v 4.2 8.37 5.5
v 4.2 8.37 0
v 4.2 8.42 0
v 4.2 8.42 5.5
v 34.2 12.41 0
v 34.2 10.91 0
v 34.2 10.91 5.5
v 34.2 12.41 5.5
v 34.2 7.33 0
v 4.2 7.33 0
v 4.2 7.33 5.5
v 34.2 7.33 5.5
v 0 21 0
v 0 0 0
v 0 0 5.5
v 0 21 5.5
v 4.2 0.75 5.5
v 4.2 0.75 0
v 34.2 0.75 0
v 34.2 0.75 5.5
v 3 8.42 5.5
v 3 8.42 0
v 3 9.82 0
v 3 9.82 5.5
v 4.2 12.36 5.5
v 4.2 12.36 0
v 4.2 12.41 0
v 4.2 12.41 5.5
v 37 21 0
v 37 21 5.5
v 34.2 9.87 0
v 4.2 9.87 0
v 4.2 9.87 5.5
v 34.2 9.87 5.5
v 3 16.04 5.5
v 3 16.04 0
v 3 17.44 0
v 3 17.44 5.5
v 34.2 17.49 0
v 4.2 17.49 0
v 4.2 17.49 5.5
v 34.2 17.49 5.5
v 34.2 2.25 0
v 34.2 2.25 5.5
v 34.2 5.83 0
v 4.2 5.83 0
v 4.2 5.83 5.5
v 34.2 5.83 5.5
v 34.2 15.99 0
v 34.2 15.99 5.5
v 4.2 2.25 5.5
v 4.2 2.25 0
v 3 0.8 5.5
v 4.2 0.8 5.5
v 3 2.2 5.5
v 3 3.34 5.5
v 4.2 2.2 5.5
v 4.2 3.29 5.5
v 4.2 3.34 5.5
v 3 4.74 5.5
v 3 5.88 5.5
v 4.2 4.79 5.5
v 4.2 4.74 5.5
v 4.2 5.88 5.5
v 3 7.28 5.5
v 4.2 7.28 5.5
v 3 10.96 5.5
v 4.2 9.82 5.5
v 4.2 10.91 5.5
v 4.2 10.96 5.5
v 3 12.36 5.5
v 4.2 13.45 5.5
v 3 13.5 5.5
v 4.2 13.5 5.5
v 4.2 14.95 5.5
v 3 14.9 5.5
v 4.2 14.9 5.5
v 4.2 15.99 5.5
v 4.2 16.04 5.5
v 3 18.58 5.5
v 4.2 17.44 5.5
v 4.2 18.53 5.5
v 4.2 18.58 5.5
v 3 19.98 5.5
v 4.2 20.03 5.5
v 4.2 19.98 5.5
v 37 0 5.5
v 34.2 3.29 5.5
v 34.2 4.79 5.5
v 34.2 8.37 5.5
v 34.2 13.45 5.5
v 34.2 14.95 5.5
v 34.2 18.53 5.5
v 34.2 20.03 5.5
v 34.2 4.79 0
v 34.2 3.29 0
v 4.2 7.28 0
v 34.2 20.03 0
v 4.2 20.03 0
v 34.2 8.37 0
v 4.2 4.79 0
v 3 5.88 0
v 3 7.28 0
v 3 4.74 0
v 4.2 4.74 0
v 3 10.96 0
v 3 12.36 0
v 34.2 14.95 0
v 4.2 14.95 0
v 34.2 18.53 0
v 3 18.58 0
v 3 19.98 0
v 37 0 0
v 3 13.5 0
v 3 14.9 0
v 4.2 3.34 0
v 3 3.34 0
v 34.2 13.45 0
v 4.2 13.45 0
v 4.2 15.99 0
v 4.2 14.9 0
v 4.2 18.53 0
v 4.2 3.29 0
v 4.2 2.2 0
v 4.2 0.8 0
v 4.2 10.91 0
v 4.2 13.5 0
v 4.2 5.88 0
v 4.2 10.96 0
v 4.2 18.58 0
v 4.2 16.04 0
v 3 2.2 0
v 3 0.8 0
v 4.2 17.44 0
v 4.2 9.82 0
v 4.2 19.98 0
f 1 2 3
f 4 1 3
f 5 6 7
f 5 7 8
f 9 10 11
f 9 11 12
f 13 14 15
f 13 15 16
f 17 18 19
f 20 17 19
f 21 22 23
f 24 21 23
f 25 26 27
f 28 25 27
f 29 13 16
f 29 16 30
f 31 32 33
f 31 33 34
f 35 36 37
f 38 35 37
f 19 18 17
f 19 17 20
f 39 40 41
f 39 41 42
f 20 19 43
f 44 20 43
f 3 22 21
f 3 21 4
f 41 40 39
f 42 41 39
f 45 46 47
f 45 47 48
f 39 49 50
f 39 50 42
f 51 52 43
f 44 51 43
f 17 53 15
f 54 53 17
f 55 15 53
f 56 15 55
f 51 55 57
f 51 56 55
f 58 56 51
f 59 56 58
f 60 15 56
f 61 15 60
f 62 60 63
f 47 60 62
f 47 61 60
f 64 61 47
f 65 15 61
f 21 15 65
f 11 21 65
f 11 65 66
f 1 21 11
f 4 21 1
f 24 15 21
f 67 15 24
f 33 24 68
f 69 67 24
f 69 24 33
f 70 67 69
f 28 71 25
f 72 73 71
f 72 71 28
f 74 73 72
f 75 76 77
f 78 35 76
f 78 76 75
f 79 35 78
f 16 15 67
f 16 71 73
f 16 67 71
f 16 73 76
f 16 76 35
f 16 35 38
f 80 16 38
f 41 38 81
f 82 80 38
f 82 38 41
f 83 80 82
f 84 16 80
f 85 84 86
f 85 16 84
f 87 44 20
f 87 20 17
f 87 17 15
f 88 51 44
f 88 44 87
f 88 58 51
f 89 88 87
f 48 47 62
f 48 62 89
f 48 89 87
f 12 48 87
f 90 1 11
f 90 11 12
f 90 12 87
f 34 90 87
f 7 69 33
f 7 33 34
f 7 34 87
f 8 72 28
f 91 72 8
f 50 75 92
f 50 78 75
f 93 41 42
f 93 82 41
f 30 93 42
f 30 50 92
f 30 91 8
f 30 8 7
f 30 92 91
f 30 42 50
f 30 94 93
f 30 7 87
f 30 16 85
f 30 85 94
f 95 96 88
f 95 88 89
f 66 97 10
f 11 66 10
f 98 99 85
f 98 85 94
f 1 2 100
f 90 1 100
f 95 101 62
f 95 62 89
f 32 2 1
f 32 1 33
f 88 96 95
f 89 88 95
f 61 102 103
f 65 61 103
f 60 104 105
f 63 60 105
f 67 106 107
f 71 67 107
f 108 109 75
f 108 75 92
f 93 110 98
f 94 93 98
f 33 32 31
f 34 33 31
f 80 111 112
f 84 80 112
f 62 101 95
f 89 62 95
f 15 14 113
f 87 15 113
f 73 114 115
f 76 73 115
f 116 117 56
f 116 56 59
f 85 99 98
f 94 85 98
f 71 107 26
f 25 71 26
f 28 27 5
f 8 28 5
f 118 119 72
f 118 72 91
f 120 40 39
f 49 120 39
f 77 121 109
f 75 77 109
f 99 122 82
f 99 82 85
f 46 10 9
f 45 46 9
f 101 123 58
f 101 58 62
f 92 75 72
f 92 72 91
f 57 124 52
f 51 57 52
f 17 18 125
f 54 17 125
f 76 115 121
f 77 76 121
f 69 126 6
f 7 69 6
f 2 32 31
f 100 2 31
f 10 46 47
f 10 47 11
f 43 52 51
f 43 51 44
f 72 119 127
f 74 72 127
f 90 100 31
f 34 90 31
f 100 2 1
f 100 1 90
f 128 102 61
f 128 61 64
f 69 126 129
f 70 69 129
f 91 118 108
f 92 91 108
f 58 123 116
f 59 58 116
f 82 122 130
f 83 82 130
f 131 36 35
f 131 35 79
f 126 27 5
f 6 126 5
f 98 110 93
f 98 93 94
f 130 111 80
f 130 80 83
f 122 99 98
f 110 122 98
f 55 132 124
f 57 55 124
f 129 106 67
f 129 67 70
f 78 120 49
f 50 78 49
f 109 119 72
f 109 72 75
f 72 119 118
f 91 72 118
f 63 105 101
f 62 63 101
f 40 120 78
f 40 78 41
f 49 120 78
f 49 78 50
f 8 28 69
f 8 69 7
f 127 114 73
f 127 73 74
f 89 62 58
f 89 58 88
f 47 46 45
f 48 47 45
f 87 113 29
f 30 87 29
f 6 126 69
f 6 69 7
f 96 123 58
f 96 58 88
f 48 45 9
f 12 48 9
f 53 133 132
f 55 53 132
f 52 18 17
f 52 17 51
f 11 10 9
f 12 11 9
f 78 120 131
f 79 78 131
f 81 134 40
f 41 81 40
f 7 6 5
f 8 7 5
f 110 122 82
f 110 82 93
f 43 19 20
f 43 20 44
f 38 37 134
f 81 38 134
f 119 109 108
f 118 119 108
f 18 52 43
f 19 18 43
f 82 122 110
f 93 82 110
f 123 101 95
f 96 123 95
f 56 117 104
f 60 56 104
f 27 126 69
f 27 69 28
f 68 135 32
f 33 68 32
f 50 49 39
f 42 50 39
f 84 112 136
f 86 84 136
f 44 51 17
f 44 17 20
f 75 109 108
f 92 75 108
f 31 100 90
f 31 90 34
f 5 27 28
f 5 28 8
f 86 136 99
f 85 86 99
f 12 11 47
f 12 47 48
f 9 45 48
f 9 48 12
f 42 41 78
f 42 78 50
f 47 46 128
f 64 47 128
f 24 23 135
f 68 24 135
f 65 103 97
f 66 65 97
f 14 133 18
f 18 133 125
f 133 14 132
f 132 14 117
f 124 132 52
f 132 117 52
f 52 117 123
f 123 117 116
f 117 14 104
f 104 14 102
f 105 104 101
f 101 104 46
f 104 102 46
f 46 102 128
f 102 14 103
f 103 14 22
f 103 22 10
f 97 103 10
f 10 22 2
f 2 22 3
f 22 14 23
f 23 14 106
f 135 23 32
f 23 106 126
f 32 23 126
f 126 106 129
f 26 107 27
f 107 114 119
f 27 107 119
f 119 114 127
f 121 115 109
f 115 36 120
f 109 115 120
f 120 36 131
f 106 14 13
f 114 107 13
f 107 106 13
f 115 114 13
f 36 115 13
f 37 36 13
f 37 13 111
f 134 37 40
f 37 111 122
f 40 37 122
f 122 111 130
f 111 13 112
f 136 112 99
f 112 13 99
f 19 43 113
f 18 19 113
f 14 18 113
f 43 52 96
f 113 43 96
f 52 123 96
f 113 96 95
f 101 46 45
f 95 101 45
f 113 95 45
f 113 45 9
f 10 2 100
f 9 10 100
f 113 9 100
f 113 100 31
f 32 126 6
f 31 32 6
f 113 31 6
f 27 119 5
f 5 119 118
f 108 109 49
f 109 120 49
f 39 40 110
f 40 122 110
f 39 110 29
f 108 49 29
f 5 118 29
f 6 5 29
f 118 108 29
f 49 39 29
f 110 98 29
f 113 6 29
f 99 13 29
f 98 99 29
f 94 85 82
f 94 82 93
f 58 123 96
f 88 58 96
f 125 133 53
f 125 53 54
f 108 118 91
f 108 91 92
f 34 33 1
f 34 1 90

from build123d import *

# Parameters (mm, degrees)
BOX010_W     = 30
BOX010_H     = 1.5
BOX010_DEPTH = 5.5
BOX011_W     = 30
BOX011_H     = 1.5
BOX011_DEPTH = 5.5
BOX012_W     = 30
BOX012_H     = 1.5
BOX012_DEPTH = 5.5
BOX013_W     = 30
BOX013_H     = 1.5
BOX013_DEPTH = 5.5
BOX014_W     = 30
BOX014_H     = 1.5
BOX014_DEPTH = 5.5
BOX015_W     = 30
BOX015_H     = 1.5
BOX015_DEPTH = 5.5
BOX016_W     = 30
BOX016_H     = 1.5
BOX016_DEPTH = 5.5
BOX009_W     = 30
BOX009_H     = 1.5
BOX009_DEPTH = 5.5
BOX018_W     = 30
BOX018_H     = 1.5
BOX018_DEPTH = 5.5
BOX019_W     = 30
BOX019_H     = 1.5
BOX019_DEPTH = 5.5
BOX020_W     = 30
BOX020_H     = 1.5
BOX020_DEPTH = 5.5
BOX021_W     = 30
BOX021_H     = 1.5
BOX021_DEPTH = 5.5
BOX022_W     = 30
BOX022_H     = 1.5
BOX022_DEPTH = 5.5
BOX023_W     = 30
BOX023_H     = 1.5
BOX023_DEPTH = 5.5
BOX024_W     = 30
BOX024_H     = 1.5
BOX024_DEPTH = 5.5
BOX017_W     = 30
BOX017_H     = 1.5
BOX017_DEPTH = 5.5
BOX002_W     = 1.6
BOX002_H     = 1.4
BOX002_DEPTH = 10
BOX003_W     = 1.6
BOX003_H     = 1.4
BOX003_DEPTH = 10
BOX004_W     = 1.6
BOX004_H     = 1.4
BOX004_DEPTH = 10
BOX005_W     = 1.6
BOX005_H     = 1.4
BOX005_DEPTH = 10
BOX006_W     = 1.6
BOX006_H     = 1.4
BOX006_DEPTH = 10
BOX007_W     = 1.6
BOX007_H     = 1.4
BOX007_DEPTH = 10
BOX008_W     = 1.6
BOX008_H     = 1.4
BOX008_DEPTH = 10
BOX001_W     = 1.6
BOX001_H     = 1.4
BOX001_DEPTH = 10
BOX_W        = 37
BOX_H        = 21
BOX_DEPTH    = 5.5


with BuildPart() as cube010:
    # Box010 → Box010 (new body)
    with BuildSketch(Plane(origin=(4.2, 3.29, 0), x_dir=(1, 0, 0), z_dir=(0, 0, 1))):
        with Locations((15, 0.75)):
            Rectangle(BOX010_W, BOX010_H)
    extrude(amount=BOX010_DEPTH)


with BuildPart() as cube011:
    # Box011 → Box011 (new body)
    with BuildSketch(Plane(origin=(4.2, 5.83, 0), x_dir=(1, 0, 0), z_dir=(0, 0, 1))):
        with Locations((15, 0.75)):
            Rectangle(BOX011_W, BOX011_H)
    extrude(amount=BOX011_DEPTH)


with BuildPart() as cube012:
    # Box012 → Box012 (new body)
    with BuildSketch(Plane(origin=(4.2, 8.37, 0), x_dir=(1, 0, 0), z_dir=(0, 0, 1))):
        with Locations((15, 0.75)):
            Rectangle(BOX012_W, BOX012_H)
    extrude(amount=BOX012_DEPTH)


with BuildPart() as cube013:
    # Box013 → Box013 (new body)
    with BuildSketch(Plane(origin=(4.2, 10.91, 0), x_dir=(1, 0, 0), z_dir=(0, 0, 1))):
        with Locations((15, 0.75)):
            Rectangle(BOX013_W, BOX013_H)
    extrude(amount=BOX013_DEPTH)


with BuildPart() as cube014:
    # Box014 → Box014 (new body)
    with BuildSketch(Plane(origin=(4.2, 13.45, 0), x_dir=(1, 0, 0), z_dir=(0, 0, 1))):
        with Locations((15, 0.75)):
            Rectangle(BOX014_W, BOX014_H)
    extrude(amount=BOX014_DEPTH)


with BuildPart() as cube015:
    # Box015 → Box015 (new body)
    with BuildSketch(Plane(origin=(4.2, 15.99, 0), x_dir=(1, 0, 0), z_dir=(0, 0, 1))):
        with Locations((15, 0.75)):
            Rectangle(BOX015_W, BOX015_H)
    extrude(amount=BOX015_DEPTH)


with BuildPart() as cube016:
    # Box016 → Box016 (new body)
    with BuildSketch(Plane(origin=(4.2, 18.53, 0), x_dir=(1, 0, 0), z_dir=(0, 0, 1))):
        with Locations((15, 0.75)):
            Rectangle(BOX016_W, BOX016_H)
    extrude(amount=BOX016_DEPTH)


with BuildPart() as conducting_filament:
    # Box009 → Box009 (new body)
    with BuildSketch(Plane(origin=(4.2, 0.75, 0), x_dir=(1, 0, 0), z_dir=(0, 0, 1))):
        with Locations((15, 0.75)):
            Rectangle(BOX009_W, BOX009_H)
    extrude(amount=BOX009_DEPTH)

    # Fusion: union Cube010, Cube011, Cube012, Cube013, Cube014, Cube015, Cube016
    add(cube010.part)
    add(cube011.part)
    add(cube012.part)
    add(cube013.part)
    add(cube014.part)
    add(cube015.part)
    add(cube016.part)


with BuildPart() as cube018:
    # Box018 → Box018 (new body)
    with BuildSketch(Plane(origin=(4.2, 10.91, 0), x_dir=(1, 0, 0), z_dir=(0, 0, 1))):
        with Locations((15, 0.75)):
            Rectangle(BOX018_W, BOX018_H)
    extrude(amount=BOX018_DEPTH)


with BuildPart() as cube019:
    # Box019 → Box019 (new body)
    with BuildSketch(Plane(origin=(4.2, 3.29, 0), x_dir=(1, 0, 0), z_dir=(0, 0, 1))):
        with Locations((15, 0.75)):
            Rectangle(BOX019_W, BOX019_H)
    extrude(amount=BOX019_DEPTH)


with BuildPart() as cube020:
    # Box020 → Box020 (new body)
    with BuildSketch(Plane(origin=(4.2, 5.83, 0), x_dir=(1, 0, 0), z_dir=(0, 0, 1))):
        with Locations((15, 0.75)):
            Rectangle(BOX020_W, BOX020_H)
    extrude(amount=BOX020_DEPTH)


with BuildPart() as cube021:
    # Box021 → Box021 (new body)
    with BuildSketch(Plane(origin=(4.2, 18.53, 0), x_dir=(1, 0, 0), z_dir=(0, 0, 1))):
        with Locations((15, 0.75)):
            Rectangle(BOX021_W, BOX021_H)
    extrude(amount=BOX021_DEPTH)


with BuildPart() as cube022:
    # Box022 → Box022 (new body)
    with BuildSketch(Plane(origin=(4.2, 15.99, 0), x_dir=(1, 0, 0), z_dir=(0, 0, 1))):
        with Locations((15, 0.75)):
            Rectangle(BOX022_W, BOX022_H)
    extrude(amount=BOX022_DEPTH)


with BuildPart() as cube023:
    # Box023 → Box023 (new body)
    with BuildSketch(Plane(origin=(4.2, 8.37, 0), x_dir=(1, 0, 0), z_dir=(0, 0, 1))):
        with Locations((15, 0.75)):
            Rectangle(BOX023_W, BOX023_H)
    extrude(amount=BOX023_DEPTH)


with BuildPart() as cube024:
    # Box024 → Box024 (new body)
    with BuildSketch(Plane(origin=(4.2, 13.45, 0), x_dir=(1, 0, 0), z_dir=(0, 0, 1))):
        with Locations((15, 0.75)):
            Rectangle(BOX024_W, BOX024_H)
    extrude(amount=BOX024_DEPTH)


with BuildPart() as fusion002:
    # Box017 → Box017 (new body)
    with BuildSketch(Plane(origin=(4.2, 0.75, 0), x_dir=(1, 0, 0), z_dir=(0, 0, 1))):
        with Locations((15, 0.75)):
            Rectangle(BOX017_W, BOX017_H)
    extrude(amount=BOX017_DEPTH)

    # Fusion002: union Cube018, Cube019, Cube020, Cube021, Cube022, Cube023, Cube024
    add(cube018.part)
    add(cube019.part)
    add(cube020.part)
    add(cube021.part)
    add(cube022.part)
    add(cube023.part)
    add(cube024.part)


with BuildPart() as cube002:
    # Box002 → Box002 (new body)
    with BuildSketch(Plane(origin=(3, 3.34, -3), x_dir=(1, 0, 0), z_dir=(0, 0, 1))):
        with Locations((0.8, 0.7)):
            Rectangle(BOX002_W, BOX002_H)
    extrude(amount=BOX002_DEPTH)


with BuildPart() as cube003:
    # Box003 → Box003 (new body)
    with BuildSketch(Plane(origin=(3, 5.88, -3), x_dir=(1, 0, 0), z_dir=(0, 0, 1))):
        with Locations((0.8, 0.7)):
            Rectangle(BOX003_W, BOX003_H)
    extrude(amount=BOX003_DEPTH)


with BuildPart() as cube004:
    # Box004 → Box004 (new body)
    with BuildSketch(Plane(origin=(3, 8.42, -3), x_dir=(1, 0, 0), z_dir=(0, 0, 1))):
        with Locations((0.8, 0.7)):
            Rectangle(BOX004_W, BOX004_H)
    extrude(amount=BOX004_DEPTH)


with BuildPart() as cube005:
    # Box005 → Box005 (new body)
    with BuildSketch(Plane(origin=(3, 10.96, -3), x_dir=(1, 0, 0), z_dir=(0, 0, 1))):
        with Locations((0.8, 0.7)):
            Rectangle(BOX005_W, BOX005_H)
    extrude(amount=BOX005_DEPTH)


with BuildPart() as cube006:
    # Box006 → Box006 (new body)
    with BuildSketch(Plane(origin=(3, 13.5, -3), x_dir=(1, 0, 0), z_dir=(0, 0, 1))):
        with Locations((0.8, 0.7)):
            Rectangle(BOX006_W, BOX006_H)
    extrude(amount=BOX006_DEPTH)


with BuildPart() as cube007:
    # Box007 → Box007 (new body)
    with BuildSketch(Plane(origin=(3, 16.04, -3), x_dir=(1, 0, 0), z_dir=(0, 0, 1))):
        with Locations((0.8, 0.7)):
            Rectangle(BOX007_W, BOX007_H)
    extrude(amount=BOX007_DEPTH)


with BuildPart() as cube008:
    # Box008 → Box008 (new body)
    with BuildSketch(Plane(origin=(3, 18.58, -3), x_dir=(1, 0, 0), z_dir=(0, 0, 1))):
        with Locations((0.8, 0.7)):
            Rectangle(BOX008_W, BOX008_H)
    extrude(amount=BOX008_DEPTH)


with BuildPart() as fusion001:
    # Box001 → Box001 (new body)
    with BuildSketch(Plane(origin=(3, 0.8, -3), x_dir=(1, 0, 0), z_dir=(0, 0, 1))):
        with Locations((0.8, 0.7)):
            Rectangle(BOX001_W, BOX001_H)
    extrude(amount=BOX001_DEPTH)

    # Fusion001: union Cube002, Cube003, Cube004, Cube005, Cube006, Cube007, Cube008
    add(cube002.part)
    add(cube003.part)
    add(cube004.part)
    add(cube005.part)
    add(cube006.part)
    add(cube007.part)
    add(cube008.part)


with BuildPart() as main_body:
    # Box → Box (new body)
    with BuildSketch(Plane.XY):
        with Locations((18.5, 10.5)):
            Rectangle(BOX_W, BOX_H)
    extrude(amount=BOX_DEPTH)

    # Cut: cut Fusion001
    add(fusion001.part, mode=Mode.SUBTRACT)

    # Cut001: cut Fusion002
    add(fusion002.part, mode=Mode.SUBTRACT)


solid = Compound([conducting_filament.part, main_body.part])
